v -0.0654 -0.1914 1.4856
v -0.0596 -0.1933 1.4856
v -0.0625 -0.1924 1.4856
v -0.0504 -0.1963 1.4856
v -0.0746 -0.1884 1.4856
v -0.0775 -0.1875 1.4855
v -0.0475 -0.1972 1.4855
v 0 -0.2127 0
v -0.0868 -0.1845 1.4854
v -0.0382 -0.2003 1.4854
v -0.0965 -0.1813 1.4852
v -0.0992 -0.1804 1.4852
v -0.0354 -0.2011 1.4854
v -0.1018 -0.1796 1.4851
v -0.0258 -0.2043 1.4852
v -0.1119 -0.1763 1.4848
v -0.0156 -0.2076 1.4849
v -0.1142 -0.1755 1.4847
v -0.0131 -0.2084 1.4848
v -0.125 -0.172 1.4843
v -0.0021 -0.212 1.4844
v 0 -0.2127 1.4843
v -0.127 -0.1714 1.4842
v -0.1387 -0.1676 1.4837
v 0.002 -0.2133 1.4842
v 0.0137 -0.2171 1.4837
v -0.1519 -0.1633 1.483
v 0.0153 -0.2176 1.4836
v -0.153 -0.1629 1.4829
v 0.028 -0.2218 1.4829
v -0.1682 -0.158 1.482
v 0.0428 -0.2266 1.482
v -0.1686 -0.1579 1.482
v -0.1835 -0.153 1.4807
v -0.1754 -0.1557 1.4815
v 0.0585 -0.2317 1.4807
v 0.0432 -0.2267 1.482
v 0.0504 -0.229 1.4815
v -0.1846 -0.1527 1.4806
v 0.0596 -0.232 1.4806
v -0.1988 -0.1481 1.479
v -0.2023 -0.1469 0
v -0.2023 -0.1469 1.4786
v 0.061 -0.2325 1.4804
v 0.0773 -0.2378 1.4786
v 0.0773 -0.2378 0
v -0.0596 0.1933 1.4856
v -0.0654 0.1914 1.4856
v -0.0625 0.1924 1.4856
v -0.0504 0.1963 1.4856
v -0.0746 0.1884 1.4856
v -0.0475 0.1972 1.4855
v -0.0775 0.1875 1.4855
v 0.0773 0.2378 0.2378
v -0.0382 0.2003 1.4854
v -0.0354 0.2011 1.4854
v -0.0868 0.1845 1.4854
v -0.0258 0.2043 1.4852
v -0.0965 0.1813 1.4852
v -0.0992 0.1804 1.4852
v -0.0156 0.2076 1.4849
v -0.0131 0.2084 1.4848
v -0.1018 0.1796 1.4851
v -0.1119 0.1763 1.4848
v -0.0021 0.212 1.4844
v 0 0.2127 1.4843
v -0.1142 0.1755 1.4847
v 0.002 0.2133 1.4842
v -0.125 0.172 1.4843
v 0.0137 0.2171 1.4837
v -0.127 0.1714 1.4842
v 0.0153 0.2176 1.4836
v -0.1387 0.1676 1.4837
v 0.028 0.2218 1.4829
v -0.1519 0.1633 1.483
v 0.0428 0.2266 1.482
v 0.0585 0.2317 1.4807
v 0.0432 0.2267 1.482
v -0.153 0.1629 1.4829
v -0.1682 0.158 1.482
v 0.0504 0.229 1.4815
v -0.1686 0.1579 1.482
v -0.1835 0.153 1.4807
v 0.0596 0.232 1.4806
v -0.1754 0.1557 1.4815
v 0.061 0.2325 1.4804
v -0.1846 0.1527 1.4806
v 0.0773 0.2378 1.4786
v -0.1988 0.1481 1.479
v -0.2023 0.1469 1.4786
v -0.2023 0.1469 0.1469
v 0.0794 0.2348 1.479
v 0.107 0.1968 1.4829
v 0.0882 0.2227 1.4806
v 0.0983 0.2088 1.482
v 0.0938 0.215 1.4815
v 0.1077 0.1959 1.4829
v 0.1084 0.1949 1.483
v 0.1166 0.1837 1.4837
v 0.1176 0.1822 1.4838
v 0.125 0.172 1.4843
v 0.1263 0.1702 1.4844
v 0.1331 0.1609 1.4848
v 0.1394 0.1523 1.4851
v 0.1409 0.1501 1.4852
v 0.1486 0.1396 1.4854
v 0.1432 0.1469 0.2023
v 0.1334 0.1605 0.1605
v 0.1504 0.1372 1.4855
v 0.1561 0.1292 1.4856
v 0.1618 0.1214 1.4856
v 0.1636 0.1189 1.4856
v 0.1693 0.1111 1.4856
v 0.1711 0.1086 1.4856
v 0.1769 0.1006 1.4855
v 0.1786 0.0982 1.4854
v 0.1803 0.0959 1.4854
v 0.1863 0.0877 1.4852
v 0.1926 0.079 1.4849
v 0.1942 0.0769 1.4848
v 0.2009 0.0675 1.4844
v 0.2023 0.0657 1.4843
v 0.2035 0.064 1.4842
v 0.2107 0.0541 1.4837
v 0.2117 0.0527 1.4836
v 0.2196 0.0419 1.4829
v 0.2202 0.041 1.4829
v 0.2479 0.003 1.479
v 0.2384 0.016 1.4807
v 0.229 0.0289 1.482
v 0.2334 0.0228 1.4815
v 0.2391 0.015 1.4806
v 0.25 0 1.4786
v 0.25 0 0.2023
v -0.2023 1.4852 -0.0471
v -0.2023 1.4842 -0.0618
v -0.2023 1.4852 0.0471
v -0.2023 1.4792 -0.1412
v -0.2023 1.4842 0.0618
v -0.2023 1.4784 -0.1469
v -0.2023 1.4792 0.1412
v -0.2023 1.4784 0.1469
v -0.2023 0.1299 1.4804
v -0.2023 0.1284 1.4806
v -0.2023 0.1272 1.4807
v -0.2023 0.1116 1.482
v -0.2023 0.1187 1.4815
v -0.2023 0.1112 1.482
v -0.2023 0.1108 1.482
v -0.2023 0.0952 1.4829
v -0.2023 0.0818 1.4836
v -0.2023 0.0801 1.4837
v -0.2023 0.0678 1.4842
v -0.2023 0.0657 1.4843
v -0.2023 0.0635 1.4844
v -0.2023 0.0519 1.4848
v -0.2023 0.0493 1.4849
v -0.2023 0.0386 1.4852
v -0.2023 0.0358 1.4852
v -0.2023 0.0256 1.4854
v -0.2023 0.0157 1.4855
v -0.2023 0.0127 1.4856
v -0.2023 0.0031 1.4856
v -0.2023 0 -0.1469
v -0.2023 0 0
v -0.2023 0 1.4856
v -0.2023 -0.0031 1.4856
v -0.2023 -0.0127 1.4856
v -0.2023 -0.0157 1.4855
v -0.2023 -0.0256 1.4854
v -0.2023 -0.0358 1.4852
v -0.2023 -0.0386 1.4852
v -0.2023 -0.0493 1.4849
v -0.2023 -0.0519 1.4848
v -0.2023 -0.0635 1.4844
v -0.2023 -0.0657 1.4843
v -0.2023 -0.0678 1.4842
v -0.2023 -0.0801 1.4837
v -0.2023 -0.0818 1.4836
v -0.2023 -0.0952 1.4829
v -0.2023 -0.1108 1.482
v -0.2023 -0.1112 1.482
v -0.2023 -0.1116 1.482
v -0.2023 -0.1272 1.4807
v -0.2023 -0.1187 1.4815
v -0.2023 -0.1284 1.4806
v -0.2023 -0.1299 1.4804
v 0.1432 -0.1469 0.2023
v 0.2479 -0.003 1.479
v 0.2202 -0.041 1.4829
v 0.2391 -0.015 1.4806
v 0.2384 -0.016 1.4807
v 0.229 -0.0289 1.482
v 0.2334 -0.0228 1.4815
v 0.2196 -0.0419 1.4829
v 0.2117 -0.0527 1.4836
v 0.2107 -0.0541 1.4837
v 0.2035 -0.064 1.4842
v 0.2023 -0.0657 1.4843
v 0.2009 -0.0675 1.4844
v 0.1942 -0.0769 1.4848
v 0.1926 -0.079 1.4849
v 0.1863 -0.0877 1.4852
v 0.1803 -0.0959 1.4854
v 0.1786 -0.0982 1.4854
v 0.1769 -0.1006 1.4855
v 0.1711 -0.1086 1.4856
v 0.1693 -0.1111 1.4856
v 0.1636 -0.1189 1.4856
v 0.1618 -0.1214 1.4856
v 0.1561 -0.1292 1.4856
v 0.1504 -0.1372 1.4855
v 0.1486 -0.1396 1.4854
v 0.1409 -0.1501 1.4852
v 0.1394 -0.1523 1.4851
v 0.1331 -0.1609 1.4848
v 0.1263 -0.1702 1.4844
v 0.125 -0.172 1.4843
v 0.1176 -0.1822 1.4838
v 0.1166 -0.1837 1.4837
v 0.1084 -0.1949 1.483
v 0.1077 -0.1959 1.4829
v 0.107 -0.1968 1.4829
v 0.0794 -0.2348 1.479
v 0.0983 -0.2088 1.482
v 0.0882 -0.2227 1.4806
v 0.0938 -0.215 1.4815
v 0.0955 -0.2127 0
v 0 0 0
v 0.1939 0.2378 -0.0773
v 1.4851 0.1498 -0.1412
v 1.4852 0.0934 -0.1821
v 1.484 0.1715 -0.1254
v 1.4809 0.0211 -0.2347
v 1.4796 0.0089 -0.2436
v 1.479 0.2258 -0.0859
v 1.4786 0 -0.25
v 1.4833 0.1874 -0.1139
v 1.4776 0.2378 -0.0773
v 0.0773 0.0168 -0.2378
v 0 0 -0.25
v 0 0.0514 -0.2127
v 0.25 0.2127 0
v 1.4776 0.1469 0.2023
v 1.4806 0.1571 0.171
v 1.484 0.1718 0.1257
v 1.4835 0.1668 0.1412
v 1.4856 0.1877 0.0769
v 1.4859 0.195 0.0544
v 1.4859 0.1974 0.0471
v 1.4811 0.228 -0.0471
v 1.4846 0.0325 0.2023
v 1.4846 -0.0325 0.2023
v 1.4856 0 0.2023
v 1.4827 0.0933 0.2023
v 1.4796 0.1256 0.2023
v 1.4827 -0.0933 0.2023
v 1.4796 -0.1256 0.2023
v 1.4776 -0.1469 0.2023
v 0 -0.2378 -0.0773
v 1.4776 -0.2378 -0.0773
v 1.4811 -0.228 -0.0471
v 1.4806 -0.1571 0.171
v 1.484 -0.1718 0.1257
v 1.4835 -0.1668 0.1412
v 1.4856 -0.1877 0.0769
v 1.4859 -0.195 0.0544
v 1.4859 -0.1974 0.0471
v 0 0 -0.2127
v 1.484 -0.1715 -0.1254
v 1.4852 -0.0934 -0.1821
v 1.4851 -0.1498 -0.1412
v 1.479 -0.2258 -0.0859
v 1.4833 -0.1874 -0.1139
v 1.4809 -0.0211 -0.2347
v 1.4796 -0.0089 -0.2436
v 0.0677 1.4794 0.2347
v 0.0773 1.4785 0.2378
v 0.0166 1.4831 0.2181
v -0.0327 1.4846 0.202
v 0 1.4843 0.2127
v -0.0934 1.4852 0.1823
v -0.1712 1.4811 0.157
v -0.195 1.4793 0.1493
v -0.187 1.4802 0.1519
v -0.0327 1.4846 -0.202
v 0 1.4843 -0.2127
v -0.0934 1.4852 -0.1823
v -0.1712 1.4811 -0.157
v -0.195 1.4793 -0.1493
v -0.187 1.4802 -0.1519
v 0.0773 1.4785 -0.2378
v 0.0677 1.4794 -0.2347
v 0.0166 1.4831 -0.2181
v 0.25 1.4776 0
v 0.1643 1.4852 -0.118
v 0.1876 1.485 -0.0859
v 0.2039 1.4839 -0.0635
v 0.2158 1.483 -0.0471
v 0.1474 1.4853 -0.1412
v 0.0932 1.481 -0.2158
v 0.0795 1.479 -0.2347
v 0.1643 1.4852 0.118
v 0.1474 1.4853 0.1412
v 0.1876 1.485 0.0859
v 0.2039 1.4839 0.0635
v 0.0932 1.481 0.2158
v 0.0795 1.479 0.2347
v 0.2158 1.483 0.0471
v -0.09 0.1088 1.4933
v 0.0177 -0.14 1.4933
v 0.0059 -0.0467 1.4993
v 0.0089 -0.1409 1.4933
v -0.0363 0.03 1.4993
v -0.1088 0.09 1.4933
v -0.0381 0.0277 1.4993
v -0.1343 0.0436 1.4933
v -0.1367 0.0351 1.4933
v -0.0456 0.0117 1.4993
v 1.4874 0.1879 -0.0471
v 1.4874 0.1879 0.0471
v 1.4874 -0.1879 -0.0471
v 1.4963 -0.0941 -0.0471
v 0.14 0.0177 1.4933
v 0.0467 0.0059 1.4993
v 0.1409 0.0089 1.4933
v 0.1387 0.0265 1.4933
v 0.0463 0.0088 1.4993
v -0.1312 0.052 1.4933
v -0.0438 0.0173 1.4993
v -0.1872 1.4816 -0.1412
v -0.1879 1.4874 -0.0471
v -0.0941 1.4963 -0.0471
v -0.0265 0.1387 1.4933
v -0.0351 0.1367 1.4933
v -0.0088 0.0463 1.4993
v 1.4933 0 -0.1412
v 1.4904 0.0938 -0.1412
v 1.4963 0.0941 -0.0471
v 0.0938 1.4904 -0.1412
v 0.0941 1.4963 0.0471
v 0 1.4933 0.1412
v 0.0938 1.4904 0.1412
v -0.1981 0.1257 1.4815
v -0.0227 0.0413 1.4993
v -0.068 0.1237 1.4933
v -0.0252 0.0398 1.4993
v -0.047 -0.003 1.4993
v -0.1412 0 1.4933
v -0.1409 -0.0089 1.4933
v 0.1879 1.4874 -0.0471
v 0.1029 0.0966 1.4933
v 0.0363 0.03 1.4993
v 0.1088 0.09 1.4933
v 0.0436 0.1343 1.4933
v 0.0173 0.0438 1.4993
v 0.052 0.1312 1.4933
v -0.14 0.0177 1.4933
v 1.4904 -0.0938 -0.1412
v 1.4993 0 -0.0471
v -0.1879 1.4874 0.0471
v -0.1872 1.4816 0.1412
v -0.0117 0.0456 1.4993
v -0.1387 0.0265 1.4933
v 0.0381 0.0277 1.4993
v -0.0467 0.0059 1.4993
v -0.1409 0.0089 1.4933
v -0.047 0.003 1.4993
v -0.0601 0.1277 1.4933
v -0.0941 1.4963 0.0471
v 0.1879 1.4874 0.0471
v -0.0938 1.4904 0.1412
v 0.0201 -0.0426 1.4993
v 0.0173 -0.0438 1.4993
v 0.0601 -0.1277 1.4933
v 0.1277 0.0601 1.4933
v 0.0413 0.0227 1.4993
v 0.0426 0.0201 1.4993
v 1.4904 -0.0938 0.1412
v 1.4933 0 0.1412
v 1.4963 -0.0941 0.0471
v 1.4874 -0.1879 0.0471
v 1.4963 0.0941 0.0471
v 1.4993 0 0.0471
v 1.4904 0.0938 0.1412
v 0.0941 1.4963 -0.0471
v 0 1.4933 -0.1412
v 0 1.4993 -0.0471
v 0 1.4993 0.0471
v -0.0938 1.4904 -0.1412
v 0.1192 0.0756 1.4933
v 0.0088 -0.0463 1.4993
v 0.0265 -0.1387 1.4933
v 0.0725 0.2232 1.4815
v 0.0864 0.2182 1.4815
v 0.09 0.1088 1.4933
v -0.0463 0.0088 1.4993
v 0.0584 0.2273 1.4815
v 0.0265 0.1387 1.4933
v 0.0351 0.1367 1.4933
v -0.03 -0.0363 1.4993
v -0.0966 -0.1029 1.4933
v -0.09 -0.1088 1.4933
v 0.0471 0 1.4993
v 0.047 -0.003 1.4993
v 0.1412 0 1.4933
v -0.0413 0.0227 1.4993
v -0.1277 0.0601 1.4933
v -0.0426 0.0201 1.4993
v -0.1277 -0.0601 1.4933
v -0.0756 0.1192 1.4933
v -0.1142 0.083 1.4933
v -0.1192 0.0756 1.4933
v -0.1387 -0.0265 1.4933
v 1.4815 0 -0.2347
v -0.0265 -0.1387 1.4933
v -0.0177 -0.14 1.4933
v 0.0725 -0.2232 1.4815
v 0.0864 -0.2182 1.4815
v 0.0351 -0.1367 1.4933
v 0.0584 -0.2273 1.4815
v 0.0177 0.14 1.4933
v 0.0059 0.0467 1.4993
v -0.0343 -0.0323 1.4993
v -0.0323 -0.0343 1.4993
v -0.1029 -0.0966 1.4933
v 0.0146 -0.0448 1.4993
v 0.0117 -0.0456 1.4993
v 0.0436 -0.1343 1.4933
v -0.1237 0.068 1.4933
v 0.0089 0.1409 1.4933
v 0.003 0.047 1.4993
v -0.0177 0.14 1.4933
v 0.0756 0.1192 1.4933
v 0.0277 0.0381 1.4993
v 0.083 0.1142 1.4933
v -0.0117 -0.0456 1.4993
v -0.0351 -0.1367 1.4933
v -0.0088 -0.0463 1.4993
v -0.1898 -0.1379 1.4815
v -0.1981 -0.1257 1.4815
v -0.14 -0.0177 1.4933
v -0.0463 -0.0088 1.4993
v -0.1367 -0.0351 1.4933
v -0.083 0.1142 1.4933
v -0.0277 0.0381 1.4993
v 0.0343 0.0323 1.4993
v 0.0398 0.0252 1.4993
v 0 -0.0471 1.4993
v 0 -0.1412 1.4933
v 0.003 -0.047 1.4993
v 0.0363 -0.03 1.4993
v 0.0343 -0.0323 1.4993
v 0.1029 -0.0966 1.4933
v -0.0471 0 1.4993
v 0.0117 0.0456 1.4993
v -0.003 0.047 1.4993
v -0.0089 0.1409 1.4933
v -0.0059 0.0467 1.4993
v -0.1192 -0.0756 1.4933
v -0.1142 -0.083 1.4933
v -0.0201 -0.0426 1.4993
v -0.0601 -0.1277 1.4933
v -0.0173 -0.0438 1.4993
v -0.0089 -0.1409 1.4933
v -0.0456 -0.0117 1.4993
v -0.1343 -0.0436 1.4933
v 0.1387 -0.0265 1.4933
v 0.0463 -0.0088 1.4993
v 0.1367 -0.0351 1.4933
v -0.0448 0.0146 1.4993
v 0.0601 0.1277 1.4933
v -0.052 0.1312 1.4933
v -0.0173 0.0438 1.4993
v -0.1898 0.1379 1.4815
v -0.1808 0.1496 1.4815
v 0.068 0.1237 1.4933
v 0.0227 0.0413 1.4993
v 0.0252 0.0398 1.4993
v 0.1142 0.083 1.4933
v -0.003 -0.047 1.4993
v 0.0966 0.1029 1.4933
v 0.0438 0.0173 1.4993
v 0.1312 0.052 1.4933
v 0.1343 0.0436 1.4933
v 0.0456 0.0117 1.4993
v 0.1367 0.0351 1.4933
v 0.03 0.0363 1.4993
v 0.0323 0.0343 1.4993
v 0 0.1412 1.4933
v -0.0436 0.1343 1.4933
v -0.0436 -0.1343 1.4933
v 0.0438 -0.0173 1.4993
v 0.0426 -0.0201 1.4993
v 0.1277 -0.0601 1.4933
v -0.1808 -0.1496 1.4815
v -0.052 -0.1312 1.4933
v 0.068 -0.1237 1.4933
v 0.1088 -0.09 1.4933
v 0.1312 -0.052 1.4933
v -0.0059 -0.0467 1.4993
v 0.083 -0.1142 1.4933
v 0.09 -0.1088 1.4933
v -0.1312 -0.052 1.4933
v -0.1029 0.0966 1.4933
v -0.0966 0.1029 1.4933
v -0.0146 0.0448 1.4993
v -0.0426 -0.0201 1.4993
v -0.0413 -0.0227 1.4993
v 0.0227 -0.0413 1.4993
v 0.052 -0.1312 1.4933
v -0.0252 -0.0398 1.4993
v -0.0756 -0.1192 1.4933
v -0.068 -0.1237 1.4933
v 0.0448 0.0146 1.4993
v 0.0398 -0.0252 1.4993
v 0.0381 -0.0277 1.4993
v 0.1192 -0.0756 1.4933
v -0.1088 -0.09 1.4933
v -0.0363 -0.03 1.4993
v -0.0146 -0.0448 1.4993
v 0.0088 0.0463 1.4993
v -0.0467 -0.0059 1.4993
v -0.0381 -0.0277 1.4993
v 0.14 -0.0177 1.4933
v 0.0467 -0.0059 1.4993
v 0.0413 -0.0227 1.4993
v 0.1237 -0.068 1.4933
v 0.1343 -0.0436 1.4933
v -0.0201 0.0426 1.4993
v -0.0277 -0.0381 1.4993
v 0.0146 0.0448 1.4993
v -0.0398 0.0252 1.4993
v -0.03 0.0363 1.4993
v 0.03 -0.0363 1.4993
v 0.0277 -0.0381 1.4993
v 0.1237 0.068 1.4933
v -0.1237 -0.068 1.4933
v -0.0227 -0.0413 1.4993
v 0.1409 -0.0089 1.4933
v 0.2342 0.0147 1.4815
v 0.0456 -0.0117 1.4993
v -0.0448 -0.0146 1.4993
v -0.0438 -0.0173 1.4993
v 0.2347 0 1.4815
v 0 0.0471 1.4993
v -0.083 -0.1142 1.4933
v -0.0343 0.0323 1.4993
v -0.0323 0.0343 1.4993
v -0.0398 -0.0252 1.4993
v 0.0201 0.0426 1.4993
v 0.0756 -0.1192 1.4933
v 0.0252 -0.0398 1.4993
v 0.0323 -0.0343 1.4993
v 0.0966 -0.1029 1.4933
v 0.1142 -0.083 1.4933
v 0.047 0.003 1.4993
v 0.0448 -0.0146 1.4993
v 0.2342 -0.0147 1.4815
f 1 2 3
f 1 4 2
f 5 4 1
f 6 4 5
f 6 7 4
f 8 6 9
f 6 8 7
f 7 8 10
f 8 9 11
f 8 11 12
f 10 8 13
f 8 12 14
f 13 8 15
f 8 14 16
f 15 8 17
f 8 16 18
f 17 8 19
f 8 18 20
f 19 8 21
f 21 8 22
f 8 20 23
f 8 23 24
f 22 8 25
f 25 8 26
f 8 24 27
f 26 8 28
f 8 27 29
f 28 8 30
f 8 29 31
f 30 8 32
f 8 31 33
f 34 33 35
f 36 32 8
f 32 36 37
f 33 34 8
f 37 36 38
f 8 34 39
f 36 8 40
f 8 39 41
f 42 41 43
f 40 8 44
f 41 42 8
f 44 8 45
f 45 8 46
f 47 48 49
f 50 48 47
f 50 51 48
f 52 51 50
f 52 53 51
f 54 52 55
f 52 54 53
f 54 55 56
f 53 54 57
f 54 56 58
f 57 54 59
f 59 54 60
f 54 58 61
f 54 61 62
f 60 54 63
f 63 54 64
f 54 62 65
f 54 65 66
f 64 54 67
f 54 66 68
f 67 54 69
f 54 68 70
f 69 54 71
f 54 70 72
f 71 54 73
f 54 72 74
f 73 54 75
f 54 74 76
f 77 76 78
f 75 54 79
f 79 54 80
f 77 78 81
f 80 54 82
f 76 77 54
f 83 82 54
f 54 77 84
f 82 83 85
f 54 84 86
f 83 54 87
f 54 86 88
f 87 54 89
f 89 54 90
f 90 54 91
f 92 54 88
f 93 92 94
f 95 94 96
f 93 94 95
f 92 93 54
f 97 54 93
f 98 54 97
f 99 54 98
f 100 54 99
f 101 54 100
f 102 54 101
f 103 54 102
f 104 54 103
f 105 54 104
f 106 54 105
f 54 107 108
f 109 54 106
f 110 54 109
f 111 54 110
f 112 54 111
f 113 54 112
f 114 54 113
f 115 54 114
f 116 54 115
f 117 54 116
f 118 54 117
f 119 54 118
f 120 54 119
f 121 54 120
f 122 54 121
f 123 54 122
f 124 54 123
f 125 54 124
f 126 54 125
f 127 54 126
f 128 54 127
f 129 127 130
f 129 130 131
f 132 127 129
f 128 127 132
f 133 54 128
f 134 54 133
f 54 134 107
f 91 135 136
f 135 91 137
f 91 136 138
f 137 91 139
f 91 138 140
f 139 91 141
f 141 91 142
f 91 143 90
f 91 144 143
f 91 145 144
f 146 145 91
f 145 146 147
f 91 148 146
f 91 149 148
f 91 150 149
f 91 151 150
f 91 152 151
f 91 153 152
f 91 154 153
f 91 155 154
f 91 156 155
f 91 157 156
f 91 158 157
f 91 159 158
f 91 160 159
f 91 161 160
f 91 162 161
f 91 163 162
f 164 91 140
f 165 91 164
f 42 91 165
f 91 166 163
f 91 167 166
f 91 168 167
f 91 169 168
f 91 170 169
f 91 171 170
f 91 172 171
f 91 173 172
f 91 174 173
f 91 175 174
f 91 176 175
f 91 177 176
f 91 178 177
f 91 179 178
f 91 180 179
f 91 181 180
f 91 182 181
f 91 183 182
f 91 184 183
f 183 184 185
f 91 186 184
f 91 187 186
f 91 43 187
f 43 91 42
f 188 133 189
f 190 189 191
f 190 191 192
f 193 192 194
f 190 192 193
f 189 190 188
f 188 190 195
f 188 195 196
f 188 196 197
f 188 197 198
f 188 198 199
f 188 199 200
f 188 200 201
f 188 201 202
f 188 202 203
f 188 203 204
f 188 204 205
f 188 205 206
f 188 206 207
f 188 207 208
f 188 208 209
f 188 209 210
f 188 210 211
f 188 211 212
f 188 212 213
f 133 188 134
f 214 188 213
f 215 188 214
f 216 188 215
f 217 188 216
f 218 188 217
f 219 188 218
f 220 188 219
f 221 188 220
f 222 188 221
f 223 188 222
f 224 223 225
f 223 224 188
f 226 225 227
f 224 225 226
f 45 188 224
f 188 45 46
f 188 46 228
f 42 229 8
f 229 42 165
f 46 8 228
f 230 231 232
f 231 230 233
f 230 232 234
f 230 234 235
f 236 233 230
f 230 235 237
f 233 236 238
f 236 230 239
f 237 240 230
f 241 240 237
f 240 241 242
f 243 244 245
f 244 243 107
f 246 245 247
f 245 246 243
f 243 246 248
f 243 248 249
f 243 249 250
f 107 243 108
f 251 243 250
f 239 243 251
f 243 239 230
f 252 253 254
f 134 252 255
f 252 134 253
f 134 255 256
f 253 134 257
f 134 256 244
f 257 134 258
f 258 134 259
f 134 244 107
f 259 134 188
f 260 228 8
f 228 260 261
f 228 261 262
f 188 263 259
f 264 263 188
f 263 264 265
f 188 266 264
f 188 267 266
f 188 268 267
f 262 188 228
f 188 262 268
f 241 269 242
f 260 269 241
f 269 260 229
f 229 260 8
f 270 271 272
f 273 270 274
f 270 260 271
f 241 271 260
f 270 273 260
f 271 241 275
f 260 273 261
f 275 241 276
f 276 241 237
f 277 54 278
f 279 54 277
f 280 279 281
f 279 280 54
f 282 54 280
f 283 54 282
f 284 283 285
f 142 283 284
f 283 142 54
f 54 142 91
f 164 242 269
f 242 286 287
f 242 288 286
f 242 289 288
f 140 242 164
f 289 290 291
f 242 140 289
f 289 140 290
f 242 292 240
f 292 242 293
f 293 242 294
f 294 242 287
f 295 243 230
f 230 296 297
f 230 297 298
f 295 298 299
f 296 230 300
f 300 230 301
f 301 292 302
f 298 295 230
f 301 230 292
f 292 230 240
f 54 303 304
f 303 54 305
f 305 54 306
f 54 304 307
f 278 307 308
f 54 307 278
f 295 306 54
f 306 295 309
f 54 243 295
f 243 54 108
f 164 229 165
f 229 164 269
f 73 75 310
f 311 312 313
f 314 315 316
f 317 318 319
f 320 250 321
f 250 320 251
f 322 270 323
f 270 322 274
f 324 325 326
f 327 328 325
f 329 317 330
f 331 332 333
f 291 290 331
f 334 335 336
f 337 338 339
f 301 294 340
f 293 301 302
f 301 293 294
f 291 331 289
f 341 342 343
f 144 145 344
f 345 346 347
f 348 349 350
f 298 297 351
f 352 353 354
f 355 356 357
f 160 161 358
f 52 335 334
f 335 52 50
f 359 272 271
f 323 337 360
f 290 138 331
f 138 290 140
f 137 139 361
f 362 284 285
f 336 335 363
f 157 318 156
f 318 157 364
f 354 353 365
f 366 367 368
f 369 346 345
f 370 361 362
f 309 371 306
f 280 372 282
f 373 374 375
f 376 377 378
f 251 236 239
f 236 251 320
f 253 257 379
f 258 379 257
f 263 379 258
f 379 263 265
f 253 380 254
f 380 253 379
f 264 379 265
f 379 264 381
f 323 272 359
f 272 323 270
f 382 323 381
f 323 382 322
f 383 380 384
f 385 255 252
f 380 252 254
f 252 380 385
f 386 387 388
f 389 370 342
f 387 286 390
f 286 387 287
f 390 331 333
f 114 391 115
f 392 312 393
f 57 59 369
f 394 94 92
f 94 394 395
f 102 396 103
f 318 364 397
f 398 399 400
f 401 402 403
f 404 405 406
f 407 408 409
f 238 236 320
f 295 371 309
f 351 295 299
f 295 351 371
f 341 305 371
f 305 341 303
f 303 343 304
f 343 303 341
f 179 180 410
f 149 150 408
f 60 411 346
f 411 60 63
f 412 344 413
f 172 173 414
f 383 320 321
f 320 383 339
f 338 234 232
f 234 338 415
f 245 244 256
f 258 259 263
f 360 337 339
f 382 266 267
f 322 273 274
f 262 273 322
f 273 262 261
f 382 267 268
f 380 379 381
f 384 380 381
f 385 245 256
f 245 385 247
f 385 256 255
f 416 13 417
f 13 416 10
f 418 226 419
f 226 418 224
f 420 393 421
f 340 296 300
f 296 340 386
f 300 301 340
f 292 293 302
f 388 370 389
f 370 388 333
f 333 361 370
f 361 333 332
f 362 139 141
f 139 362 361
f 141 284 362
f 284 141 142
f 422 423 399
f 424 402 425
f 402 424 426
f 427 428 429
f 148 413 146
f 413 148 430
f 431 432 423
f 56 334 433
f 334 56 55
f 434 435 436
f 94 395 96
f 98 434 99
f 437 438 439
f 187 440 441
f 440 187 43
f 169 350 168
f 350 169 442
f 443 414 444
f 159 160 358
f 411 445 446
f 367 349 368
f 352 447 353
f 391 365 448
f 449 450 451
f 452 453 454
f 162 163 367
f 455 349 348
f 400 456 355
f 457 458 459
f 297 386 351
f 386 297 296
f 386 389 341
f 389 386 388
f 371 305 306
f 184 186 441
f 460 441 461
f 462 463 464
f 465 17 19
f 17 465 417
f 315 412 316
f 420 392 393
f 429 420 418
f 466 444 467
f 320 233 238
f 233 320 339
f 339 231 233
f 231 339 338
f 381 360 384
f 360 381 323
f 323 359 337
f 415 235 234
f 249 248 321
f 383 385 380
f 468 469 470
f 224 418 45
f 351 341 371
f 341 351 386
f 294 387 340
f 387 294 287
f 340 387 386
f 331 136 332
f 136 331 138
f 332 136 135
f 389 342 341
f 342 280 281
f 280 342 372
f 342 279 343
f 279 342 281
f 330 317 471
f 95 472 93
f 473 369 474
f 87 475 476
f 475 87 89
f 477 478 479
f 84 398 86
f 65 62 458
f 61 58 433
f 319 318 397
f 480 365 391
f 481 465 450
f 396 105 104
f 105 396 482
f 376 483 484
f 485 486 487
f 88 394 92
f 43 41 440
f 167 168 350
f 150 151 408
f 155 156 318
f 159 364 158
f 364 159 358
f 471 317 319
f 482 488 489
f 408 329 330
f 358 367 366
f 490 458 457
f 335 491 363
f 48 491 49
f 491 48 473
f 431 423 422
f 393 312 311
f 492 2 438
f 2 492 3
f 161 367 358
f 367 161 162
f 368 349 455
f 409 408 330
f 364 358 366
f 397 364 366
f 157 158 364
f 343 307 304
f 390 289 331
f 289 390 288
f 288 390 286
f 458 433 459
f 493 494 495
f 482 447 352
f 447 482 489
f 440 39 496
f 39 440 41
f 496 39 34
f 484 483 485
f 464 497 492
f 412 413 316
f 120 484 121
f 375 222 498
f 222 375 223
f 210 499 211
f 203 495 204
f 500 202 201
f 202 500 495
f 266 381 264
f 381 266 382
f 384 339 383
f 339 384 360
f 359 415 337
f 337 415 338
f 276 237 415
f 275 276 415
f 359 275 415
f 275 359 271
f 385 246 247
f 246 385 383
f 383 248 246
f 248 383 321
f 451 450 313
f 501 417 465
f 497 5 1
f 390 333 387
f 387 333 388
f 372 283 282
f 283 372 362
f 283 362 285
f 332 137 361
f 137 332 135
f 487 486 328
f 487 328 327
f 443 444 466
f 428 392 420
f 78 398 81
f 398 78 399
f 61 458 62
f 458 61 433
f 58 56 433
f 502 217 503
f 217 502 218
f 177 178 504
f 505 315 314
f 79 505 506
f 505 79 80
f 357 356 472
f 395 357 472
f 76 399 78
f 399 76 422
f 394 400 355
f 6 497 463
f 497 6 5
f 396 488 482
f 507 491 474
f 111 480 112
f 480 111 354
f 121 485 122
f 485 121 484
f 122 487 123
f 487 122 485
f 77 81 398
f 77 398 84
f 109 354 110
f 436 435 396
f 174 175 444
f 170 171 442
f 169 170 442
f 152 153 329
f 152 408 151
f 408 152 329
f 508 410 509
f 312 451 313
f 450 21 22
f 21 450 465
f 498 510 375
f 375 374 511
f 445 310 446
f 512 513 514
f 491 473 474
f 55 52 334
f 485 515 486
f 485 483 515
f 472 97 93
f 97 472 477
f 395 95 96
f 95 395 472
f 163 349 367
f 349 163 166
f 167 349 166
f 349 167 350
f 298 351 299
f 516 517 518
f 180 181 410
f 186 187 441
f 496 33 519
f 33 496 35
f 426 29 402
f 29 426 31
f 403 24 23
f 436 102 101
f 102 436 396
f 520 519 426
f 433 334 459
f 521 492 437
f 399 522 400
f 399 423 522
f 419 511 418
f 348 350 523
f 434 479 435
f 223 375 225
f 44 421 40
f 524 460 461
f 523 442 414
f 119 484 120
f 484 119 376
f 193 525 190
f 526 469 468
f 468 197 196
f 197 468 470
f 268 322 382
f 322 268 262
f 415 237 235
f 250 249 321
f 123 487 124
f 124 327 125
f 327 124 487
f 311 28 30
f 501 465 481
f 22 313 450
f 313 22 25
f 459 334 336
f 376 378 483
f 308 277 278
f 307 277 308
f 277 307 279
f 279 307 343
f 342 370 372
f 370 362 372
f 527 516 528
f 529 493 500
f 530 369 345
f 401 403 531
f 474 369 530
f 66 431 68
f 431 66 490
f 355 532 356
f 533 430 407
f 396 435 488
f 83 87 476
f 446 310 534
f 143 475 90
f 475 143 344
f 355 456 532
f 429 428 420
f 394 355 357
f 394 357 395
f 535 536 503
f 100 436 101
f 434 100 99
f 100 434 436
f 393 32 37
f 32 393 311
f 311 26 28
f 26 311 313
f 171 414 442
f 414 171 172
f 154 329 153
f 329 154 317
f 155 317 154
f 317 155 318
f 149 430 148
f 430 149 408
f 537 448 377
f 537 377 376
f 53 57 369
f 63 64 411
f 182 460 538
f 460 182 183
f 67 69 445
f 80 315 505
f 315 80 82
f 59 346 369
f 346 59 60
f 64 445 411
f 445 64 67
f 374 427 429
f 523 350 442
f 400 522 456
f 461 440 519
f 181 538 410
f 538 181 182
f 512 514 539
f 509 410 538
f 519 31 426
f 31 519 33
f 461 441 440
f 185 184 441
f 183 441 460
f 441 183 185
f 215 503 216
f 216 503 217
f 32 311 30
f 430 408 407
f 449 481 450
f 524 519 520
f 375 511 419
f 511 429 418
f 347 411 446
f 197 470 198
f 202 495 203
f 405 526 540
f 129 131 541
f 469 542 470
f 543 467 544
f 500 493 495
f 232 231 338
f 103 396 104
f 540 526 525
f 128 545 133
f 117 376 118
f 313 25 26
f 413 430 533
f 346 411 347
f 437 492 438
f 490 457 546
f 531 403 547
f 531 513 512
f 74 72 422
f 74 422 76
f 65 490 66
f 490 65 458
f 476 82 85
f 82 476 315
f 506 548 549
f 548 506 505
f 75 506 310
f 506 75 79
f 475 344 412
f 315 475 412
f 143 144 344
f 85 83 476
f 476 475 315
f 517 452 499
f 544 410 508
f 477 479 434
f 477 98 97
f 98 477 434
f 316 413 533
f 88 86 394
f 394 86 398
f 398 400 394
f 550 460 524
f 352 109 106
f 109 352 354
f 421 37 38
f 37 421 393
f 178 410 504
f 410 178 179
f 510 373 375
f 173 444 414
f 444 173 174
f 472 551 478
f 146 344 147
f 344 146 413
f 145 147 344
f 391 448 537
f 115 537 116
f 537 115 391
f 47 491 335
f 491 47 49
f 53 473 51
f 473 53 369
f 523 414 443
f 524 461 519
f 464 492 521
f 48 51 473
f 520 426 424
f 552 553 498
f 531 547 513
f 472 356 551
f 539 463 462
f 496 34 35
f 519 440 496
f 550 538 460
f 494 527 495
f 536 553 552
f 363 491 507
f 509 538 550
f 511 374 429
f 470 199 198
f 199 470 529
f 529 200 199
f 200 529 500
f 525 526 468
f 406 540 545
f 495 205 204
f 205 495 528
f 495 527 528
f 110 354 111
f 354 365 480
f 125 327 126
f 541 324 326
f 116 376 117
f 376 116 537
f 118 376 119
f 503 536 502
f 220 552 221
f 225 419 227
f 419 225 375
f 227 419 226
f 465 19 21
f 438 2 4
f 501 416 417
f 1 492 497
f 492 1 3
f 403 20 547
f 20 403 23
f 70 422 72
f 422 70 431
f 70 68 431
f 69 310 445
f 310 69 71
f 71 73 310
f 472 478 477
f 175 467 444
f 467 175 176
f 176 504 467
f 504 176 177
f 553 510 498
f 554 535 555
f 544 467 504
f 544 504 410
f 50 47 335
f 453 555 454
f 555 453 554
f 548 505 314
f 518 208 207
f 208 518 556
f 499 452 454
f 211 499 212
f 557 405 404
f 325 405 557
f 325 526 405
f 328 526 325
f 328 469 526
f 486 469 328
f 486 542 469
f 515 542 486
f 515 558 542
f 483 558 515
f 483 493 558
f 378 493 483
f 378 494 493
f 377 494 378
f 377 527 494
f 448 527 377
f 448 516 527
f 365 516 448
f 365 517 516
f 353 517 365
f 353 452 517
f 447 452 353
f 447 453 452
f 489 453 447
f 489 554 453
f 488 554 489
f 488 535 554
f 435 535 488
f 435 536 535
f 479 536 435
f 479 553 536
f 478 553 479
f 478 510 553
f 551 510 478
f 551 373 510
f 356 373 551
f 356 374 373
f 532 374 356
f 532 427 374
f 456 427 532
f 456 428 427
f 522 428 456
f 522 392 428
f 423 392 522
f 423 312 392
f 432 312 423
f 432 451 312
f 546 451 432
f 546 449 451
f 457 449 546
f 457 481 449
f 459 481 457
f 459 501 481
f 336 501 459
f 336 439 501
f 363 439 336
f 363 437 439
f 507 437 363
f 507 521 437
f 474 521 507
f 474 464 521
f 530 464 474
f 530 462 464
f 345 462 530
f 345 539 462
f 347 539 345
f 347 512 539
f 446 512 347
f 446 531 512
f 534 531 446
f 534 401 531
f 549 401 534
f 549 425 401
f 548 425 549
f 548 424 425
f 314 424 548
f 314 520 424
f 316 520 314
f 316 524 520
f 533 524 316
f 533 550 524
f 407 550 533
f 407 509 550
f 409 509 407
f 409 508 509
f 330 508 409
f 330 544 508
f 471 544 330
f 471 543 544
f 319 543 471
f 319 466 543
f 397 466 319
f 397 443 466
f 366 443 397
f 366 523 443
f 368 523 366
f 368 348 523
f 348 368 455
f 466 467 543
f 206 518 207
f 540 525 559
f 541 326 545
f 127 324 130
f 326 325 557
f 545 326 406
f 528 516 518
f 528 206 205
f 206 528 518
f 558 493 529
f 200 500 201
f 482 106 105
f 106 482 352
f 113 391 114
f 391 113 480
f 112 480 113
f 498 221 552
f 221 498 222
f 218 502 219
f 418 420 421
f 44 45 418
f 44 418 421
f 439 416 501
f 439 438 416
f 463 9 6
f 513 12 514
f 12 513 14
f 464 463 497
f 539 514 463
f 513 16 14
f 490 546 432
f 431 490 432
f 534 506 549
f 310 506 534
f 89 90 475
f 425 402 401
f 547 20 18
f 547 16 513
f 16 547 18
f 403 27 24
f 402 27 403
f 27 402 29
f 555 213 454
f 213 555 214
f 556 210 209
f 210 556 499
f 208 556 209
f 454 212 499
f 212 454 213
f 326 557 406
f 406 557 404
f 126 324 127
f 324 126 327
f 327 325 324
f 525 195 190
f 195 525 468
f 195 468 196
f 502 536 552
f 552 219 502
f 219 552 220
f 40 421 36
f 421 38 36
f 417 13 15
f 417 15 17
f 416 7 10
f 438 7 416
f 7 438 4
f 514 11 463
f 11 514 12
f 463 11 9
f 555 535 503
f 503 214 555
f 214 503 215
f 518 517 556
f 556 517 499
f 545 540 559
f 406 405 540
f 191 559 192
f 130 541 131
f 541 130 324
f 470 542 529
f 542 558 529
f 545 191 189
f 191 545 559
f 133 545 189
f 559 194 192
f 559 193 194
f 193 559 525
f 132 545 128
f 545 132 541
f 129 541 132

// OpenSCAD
intersection() {
    union() {
        translate([0,0,0]) cylinder(h=7,d=0.5);
        translate([0,7,0]) cylinder(h=7,d=0.5);
        translate([7,7,0]) cylinder(h=7,d=0.5);
        translate([7,0,0]) cylinder(h=7,d=0.5);

        translate([0,0,0]) rotate([0,90,0]) cylinder(h=7,d=0.5);
        translate([0,7,0]) rotate([0,90,0]) cylinder(h=7,d=0.5);
        translate([0,0,7]) rotate([0,90,0]) cylinder(h=7,d=0.5);
        translate([0,7,7]) rotate([0,90,0]) cylinder(h=7,d=0.5);

        translate([0,0,0]) rotate([-90,0,0]) cylinder(h=7,d=0.5);
        translate([7,0,0]) rotate([-90,0,0]) cylinder(h=7,d=0.5);
        translate([0,0,7]) rotate([-90,0,0]) cylinder(h=7,d=0.5);
        translate([7,0,7]) rotate([-90,0,0]) cylinder(h=7,d=0.5);
    }

    sphere(1.5, $fn=100);
}
